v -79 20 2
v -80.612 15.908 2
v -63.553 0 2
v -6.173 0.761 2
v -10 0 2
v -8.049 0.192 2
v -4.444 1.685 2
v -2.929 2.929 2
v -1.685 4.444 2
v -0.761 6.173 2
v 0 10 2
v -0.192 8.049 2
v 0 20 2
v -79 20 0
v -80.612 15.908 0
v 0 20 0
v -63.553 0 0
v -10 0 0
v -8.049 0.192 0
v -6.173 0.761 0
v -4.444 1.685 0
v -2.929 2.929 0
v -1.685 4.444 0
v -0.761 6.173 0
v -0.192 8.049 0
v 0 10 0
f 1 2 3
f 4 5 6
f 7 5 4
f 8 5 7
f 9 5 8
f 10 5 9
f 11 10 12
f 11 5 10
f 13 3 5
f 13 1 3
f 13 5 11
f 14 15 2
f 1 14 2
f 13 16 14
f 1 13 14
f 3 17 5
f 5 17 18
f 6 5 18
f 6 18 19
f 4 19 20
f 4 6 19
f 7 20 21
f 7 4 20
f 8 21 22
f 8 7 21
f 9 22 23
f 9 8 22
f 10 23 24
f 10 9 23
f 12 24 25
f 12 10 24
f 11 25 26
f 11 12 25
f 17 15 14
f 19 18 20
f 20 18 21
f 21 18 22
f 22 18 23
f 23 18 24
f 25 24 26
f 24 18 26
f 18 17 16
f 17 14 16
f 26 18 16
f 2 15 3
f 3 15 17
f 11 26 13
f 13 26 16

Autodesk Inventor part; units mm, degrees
ref_plane "YZ Plane" through (0, 0, 0) normal (1, 0, 0) x (0, 1, 0)
ref_plane "XZ Plane" through (0, 0, 0) normal (0, 1, 0) x (-1, 0, 0)
ref_plane "XY Plane" through (0, 0, 0) normal (0, 0, 1) x (1, 0, 0)
sketch "Sketch2" plane through (0, 0, 0) normal (0, 0, 1) x (1, 0, 0)
  line L0 (0, 0) -> (0, 20)
  line L1 (0, 20) -> (-85, 20)
  line L2 (-85, 20) -> (-85, 0)
  line L3 (-85, 0) -> (0, 0)
  line L4 (-85, 20) -> (-63.5526, 0)
  dimension "d10" = 20
  dimension "d30" = 85
  dimension "d31" = 43
extrude "Plate1" add sketch "Sketch2" along normal blind 2 contours L3 L4 L1 L0
fillet "Corner Round2" radius 10 1 edges at (0, 0, 1)
chamfer "Corner Chamfer1" distance 6 angle 45 1 edges at (-85, 20, 1)
equation "\"d7\" = Thickness"
equation "\"BendReliefWidth\" = Thickness"
equation "\"BendReliefDepth\" = 0.5 * Thickness"
equation "\"CornerReliefSize\" = 4 * Thickness"
equation "\"MinimumRemnant\" = 2 * Thickness"
equation "\"TransitionRadius\" = BendRadius"
equation "\"JacobiRadiusSize\" = BendRadius"
equation "\"GapSize\" = Thickness"
equation "\"Thickness\" = 2"
equation "\"BendRadius\" = 2.75"
properties part number "MSC 125 ROСKET PILLAR" material "Stainless Steel"
